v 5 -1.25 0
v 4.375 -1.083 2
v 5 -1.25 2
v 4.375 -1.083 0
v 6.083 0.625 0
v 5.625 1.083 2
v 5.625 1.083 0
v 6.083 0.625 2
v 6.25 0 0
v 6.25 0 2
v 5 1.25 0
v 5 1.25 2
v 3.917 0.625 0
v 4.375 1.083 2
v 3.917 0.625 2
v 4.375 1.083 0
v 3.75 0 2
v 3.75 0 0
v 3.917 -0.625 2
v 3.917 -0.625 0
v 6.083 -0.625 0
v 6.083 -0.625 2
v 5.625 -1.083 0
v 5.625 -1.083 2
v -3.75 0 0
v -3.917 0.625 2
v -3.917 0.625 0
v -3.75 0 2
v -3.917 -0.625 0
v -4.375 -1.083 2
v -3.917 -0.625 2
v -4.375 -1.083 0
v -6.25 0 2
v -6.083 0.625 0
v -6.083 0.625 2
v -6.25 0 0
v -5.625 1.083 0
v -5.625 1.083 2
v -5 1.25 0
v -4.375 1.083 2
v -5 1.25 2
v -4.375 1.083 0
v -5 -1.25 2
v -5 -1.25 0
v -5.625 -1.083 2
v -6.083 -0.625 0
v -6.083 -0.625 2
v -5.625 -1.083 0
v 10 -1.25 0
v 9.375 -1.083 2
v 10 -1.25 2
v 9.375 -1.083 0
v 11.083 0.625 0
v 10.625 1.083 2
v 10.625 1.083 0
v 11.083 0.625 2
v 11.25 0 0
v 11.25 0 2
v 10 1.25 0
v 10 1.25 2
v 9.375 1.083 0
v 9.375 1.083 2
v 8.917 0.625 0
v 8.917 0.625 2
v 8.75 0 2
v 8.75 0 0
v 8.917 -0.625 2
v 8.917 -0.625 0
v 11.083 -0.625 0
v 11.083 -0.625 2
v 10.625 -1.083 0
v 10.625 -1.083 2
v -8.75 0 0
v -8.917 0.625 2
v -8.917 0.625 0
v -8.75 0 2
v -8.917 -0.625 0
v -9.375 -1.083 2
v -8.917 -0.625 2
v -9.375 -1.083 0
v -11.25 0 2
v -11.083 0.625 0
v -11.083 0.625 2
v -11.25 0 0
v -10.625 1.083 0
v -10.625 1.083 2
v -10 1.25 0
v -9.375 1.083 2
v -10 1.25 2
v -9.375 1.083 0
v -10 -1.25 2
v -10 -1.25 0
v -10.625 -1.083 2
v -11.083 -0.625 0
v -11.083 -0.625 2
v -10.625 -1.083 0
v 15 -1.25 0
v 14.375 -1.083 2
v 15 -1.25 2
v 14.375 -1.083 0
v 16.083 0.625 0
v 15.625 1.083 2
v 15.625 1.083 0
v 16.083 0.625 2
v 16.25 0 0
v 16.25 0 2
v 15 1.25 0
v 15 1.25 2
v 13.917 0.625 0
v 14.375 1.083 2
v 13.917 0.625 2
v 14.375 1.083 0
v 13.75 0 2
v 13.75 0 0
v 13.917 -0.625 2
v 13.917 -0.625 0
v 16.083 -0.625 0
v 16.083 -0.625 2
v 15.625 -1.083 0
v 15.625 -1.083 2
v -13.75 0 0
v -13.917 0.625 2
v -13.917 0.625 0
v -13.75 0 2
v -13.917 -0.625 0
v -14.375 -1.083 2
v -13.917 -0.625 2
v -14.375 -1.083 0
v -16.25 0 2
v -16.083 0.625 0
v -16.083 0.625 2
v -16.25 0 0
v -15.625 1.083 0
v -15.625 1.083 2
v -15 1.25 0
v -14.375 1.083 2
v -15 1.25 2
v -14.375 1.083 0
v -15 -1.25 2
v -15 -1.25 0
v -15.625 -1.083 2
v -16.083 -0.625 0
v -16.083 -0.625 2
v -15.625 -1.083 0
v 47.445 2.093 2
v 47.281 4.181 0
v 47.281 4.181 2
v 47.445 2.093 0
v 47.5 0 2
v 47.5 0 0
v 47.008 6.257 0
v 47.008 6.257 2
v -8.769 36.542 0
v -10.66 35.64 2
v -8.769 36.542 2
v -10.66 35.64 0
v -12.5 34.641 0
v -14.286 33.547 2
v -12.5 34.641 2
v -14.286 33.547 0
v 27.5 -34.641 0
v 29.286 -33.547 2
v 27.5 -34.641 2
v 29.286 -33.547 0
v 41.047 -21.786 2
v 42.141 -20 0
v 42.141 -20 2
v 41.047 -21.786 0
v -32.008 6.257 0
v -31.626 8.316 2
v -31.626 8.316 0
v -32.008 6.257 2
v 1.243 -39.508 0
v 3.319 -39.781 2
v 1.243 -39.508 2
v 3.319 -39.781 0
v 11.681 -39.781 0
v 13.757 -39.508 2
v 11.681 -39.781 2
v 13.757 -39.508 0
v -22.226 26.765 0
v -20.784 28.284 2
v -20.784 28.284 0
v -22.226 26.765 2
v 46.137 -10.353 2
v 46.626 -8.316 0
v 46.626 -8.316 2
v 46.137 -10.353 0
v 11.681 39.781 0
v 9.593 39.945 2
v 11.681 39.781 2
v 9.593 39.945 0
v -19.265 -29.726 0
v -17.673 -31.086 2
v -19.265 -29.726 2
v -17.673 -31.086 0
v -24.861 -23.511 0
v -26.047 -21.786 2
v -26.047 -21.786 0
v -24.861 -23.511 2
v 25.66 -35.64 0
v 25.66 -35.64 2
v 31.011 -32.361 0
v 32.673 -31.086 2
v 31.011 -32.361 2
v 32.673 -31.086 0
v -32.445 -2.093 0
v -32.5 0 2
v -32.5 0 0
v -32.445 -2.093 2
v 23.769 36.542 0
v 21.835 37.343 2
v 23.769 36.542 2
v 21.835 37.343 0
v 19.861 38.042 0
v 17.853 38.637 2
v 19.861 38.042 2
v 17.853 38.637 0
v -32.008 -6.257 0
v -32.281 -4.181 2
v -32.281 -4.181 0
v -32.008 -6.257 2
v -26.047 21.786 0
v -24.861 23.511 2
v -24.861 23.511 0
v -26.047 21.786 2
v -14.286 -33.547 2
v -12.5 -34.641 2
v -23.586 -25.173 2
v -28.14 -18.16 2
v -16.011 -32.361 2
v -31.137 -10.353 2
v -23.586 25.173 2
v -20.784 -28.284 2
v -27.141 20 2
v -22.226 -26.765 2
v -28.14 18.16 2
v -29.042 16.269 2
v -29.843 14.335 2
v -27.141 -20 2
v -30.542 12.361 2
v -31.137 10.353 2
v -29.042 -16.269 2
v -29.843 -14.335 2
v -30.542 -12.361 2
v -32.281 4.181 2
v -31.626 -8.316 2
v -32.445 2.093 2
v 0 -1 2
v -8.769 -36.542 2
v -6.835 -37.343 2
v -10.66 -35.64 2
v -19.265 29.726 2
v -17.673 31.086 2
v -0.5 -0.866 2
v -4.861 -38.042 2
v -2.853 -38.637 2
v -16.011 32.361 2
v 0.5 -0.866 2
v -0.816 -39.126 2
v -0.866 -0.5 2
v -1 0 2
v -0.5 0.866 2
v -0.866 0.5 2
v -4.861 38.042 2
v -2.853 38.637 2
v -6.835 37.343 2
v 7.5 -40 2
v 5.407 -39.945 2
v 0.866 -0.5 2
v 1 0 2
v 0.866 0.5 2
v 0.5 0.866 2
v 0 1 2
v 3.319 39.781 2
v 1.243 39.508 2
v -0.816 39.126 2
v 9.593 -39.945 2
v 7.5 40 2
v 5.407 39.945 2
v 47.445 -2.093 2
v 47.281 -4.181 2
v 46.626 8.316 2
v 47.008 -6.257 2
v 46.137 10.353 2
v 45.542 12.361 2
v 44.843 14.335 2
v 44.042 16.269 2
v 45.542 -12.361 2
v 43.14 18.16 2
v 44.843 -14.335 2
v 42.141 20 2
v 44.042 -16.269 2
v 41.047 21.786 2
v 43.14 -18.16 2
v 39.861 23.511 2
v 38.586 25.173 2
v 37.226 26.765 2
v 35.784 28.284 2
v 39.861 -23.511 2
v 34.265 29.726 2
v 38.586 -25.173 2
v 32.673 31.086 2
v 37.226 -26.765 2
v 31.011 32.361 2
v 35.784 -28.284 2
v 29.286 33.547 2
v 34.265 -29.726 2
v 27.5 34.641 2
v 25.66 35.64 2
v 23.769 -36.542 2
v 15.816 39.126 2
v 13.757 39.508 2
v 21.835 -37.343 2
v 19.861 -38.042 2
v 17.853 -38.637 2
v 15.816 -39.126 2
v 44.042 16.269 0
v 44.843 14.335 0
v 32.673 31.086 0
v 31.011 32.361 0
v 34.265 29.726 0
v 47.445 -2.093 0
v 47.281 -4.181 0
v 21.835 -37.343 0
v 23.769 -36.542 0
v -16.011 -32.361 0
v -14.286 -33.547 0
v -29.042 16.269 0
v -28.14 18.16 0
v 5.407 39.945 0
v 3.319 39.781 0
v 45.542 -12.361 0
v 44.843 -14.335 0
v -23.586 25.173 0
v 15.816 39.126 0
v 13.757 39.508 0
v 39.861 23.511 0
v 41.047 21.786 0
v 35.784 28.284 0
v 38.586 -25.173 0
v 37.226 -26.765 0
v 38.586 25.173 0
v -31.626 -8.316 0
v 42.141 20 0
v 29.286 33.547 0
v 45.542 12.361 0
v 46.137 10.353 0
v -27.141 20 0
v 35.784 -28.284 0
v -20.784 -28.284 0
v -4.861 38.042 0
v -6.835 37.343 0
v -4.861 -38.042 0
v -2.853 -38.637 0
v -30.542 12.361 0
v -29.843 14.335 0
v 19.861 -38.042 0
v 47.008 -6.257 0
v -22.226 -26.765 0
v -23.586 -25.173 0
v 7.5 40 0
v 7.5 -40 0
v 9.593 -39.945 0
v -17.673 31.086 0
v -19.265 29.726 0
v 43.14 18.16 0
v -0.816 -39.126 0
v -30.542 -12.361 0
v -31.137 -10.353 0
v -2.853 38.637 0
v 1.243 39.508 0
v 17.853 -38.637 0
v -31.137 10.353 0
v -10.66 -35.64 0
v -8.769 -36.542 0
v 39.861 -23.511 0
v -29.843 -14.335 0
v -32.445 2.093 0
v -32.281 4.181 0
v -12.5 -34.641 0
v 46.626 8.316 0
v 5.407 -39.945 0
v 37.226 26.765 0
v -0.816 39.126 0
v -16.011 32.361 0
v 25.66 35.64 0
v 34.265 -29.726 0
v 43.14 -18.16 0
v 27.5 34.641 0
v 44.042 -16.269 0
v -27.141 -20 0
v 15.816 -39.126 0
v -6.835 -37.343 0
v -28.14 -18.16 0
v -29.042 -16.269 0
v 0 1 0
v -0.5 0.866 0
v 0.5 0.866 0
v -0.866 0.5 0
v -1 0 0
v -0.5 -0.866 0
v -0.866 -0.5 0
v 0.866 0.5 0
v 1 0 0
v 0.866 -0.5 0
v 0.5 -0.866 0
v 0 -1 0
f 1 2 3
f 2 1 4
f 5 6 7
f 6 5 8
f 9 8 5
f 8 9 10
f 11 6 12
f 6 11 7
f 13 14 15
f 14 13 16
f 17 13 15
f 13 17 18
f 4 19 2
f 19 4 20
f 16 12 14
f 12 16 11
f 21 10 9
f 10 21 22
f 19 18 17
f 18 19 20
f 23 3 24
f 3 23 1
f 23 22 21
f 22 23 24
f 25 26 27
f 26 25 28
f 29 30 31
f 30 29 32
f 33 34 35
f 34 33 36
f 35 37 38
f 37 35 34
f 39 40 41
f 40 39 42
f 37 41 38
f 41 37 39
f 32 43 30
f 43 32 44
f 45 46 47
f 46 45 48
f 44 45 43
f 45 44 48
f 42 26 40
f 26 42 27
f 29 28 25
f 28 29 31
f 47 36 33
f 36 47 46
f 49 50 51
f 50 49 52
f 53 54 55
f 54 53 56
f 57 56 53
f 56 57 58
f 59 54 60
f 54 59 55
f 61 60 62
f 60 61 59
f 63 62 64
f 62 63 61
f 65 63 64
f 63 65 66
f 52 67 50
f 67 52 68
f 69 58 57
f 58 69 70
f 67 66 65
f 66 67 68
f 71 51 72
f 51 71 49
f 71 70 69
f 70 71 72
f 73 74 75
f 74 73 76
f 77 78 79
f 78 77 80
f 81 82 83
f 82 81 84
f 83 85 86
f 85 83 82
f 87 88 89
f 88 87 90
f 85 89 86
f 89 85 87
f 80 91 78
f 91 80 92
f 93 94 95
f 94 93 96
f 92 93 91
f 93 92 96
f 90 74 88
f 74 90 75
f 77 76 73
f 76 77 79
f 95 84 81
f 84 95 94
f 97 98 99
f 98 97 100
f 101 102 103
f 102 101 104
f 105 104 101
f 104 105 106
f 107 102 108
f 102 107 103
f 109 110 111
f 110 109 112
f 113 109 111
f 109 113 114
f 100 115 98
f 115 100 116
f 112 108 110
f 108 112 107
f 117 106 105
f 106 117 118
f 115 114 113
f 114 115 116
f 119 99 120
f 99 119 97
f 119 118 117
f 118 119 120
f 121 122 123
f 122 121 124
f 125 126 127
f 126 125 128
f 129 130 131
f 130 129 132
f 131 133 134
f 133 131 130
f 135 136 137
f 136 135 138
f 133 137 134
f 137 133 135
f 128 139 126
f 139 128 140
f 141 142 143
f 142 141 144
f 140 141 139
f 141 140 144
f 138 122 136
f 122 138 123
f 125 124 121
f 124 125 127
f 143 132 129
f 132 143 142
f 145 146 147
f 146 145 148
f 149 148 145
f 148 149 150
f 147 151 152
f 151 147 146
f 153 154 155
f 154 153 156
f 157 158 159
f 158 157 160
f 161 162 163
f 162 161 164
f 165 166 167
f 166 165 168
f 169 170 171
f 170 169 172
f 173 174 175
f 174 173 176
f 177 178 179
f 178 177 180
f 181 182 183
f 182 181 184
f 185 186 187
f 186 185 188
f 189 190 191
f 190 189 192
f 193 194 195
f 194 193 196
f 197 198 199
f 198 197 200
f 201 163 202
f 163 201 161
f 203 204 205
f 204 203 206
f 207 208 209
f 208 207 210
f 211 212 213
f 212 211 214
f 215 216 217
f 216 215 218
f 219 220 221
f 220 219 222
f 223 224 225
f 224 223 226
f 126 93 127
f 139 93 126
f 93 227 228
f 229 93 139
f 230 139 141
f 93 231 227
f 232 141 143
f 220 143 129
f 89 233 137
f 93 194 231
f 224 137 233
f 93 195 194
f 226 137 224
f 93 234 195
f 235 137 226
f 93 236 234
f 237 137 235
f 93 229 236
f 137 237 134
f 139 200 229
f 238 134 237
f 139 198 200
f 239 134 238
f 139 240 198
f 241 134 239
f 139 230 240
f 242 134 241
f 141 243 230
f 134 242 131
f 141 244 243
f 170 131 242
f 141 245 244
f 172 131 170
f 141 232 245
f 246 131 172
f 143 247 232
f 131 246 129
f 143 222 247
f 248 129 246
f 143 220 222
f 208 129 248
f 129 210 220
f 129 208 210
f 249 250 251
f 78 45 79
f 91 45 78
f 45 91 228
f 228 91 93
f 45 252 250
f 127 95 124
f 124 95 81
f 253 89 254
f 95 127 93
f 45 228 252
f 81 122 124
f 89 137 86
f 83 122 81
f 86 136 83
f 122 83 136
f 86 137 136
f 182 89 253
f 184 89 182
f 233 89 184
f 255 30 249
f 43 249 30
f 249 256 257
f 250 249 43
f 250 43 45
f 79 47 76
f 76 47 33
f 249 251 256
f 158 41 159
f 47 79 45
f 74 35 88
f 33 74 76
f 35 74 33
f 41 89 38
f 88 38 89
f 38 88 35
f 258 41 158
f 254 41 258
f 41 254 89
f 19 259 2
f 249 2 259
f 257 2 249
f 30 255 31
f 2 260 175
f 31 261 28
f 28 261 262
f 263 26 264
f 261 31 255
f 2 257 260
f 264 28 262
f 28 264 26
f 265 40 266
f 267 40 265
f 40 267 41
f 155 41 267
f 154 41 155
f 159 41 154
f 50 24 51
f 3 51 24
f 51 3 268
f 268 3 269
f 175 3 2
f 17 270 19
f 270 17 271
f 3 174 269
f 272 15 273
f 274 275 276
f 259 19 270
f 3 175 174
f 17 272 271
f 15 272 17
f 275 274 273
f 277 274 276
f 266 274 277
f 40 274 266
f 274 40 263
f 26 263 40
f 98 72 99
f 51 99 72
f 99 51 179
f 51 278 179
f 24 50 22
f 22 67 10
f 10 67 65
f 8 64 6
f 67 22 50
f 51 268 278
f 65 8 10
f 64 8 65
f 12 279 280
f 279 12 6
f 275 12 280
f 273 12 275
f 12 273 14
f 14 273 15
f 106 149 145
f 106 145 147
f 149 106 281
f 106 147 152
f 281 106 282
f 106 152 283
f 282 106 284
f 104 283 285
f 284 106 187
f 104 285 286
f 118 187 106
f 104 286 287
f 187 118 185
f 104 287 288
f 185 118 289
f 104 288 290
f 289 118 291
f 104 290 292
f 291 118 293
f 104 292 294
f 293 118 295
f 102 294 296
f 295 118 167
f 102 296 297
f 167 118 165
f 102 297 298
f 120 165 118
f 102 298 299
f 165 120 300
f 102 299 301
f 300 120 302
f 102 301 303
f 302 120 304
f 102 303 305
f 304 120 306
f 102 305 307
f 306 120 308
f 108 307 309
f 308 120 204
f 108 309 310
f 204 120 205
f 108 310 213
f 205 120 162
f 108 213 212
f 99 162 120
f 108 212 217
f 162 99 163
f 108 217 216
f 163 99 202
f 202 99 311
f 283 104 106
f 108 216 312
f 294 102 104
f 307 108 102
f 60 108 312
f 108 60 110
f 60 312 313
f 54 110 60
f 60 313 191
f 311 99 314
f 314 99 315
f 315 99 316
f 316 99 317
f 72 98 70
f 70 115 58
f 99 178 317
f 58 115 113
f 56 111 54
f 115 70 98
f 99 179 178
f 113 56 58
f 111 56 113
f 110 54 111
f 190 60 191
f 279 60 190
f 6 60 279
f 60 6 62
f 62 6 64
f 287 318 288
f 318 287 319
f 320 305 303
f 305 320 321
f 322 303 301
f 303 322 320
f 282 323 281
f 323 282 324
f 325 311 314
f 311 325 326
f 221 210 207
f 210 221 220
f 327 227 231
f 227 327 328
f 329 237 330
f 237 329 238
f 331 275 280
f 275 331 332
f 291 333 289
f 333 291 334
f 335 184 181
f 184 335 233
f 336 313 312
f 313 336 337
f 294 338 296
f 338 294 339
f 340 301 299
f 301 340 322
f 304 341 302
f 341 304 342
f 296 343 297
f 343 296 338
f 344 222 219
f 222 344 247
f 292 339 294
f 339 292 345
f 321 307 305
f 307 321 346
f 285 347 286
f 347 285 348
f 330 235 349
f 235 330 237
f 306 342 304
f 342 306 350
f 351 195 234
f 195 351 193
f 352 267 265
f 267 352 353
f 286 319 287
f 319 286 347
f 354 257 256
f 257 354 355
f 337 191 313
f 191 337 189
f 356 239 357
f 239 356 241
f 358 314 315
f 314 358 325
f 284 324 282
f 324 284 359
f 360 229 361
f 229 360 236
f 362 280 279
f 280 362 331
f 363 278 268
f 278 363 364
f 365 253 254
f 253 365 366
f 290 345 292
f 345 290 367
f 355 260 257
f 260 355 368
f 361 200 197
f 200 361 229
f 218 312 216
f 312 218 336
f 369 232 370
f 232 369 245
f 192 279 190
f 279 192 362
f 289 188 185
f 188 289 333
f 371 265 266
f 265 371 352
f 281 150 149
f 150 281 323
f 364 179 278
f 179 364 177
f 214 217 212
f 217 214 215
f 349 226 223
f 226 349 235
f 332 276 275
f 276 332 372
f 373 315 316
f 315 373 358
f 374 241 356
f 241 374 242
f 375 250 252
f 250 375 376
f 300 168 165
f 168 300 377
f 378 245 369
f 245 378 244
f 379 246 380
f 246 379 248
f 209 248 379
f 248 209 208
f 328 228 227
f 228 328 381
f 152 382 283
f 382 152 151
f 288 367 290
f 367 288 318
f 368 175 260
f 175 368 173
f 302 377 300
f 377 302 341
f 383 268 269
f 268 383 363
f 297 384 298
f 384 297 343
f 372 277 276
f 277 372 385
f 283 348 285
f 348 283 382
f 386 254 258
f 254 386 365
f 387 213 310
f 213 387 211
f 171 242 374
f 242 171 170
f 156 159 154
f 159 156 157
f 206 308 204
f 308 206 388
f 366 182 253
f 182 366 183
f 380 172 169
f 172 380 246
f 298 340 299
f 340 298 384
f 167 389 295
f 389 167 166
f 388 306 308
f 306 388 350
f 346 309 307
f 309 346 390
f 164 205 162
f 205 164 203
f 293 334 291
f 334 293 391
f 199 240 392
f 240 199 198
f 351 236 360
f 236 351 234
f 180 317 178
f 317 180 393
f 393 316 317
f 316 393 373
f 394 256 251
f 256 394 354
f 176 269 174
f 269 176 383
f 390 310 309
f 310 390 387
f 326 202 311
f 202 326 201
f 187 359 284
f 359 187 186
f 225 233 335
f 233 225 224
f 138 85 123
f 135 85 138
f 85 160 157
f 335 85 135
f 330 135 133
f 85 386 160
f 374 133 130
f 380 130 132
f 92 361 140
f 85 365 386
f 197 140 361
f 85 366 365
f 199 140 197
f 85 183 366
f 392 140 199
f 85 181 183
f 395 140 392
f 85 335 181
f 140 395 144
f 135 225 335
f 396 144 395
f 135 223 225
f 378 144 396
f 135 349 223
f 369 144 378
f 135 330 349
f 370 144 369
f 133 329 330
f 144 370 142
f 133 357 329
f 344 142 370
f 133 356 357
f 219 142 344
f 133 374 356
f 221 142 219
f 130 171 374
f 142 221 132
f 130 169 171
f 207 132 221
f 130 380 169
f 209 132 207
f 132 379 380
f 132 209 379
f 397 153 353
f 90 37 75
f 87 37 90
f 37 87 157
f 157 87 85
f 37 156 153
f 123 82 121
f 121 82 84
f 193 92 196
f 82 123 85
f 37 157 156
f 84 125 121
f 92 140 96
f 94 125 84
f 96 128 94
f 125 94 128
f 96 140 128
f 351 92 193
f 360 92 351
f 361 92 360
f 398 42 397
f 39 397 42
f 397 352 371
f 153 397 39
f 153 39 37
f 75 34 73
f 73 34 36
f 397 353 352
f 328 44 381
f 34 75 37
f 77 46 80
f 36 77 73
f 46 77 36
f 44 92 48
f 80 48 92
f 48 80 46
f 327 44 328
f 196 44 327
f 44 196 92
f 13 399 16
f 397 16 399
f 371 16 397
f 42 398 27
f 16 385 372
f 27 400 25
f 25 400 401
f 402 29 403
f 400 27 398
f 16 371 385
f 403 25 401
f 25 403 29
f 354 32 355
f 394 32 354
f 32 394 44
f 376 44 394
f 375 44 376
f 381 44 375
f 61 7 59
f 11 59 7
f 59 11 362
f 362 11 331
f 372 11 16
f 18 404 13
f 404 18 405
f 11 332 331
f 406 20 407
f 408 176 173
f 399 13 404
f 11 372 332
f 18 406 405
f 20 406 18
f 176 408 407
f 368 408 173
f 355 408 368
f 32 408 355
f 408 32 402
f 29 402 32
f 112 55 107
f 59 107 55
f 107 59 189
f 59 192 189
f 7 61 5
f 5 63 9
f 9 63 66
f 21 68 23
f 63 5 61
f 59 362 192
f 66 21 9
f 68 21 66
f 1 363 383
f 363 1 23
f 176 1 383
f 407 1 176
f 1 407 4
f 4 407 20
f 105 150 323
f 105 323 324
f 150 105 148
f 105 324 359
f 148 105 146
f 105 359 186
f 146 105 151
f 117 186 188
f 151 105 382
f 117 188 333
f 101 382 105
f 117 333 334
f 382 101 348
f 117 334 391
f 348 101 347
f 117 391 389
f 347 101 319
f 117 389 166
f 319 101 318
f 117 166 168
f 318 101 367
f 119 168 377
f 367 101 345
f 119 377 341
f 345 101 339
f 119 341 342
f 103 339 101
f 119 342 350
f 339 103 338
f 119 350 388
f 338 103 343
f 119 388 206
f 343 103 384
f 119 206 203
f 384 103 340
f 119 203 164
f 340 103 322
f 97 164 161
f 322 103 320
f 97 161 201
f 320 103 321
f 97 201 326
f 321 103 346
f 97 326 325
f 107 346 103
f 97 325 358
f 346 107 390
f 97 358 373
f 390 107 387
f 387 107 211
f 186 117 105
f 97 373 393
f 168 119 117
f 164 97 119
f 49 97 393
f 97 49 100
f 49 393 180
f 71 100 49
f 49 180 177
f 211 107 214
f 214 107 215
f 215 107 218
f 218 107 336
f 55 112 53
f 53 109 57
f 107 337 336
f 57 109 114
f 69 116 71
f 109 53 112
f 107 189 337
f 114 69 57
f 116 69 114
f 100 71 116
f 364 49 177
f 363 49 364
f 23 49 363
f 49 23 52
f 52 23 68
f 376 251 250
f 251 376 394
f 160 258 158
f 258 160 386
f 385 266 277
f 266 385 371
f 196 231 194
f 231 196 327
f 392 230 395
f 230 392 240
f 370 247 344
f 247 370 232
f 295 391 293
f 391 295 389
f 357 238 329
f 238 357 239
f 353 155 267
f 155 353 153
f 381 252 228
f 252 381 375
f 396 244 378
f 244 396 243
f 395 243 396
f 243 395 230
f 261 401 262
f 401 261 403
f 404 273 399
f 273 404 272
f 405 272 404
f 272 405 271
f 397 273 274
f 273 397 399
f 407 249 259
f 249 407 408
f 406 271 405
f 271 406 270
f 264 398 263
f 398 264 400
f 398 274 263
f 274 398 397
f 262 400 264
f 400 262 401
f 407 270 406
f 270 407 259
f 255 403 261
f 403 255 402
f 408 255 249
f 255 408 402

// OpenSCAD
//plan to have servo horn with 15mm offset to make cam


module eccentrichorn(sized=80,offset=15){
    difference(){
    translate([offset/2,0,0])cylinder(h=2,d=sized,$fn=120);
    
translate([0,0,-50])        cylinder(d=2,h=100,$fn=12);
        
         for (i = [1:3]) { 
            translate([i*5,0,-50]) cylinder(d=2.5,h=100,$fn=12);
mirror([1,0,0])translate([i*5,0,-50]) cylinder(d=2.5,h=100,$fn=12);
             }
        
    }
}


eccentrichorn();
